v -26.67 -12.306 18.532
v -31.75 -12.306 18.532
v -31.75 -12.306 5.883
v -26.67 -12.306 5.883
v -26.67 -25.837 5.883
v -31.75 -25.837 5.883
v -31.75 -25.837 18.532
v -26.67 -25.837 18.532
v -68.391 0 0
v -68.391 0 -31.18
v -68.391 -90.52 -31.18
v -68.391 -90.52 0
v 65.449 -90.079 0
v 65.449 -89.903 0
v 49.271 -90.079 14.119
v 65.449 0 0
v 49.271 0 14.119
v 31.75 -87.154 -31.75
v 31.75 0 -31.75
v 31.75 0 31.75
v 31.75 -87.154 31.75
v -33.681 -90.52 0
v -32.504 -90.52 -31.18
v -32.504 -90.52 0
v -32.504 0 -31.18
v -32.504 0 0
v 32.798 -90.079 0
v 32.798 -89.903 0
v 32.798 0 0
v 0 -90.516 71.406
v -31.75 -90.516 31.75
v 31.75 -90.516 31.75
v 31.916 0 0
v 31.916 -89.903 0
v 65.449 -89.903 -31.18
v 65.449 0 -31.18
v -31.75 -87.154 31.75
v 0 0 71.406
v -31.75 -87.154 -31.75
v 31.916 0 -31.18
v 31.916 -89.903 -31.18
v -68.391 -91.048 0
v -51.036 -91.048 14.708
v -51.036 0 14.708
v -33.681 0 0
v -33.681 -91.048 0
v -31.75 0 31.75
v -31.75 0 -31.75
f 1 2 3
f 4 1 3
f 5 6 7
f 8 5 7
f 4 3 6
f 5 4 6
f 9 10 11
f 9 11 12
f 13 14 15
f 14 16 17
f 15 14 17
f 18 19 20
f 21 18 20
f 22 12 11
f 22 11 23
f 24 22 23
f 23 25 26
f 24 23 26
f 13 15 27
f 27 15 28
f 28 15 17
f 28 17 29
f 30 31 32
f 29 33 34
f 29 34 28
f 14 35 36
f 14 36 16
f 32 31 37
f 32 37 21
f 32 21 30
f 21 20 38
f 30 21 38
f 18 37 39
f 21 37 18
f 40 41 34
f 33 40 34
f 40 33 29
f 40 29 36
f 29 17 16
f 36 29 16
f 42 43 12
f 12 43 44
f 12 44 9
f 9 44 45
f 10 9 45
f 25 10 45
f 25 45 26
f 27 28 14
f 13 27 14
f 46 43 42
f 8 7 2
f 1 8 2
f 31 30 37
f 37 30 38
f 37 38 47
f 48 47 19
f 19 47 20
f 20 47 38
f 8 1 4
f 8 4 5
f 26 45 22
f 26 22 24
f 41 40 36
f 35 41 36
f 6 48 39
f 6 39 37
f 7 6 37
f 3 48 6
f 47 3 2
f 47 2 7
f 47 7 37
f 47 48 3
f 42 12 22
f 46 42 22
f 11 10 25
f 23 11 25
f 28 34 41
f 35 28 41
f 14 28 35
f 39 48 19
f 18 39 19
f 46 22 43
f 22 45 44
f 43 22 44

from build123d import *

# Parameters (mm, degrees)
F0_W      = 63.5
F0_H      = 63.5
F1_DEPTH  = 90.51564
F3_W      = 10.2954022586
F3_H      = 21.1791172624
F4_DEPTH  = 1.27
F6_W      = 6.7655518651
F6_H      = 6.3243201002
F7_DEPTH  = 5.08
F8_W      = 35.8868353069
F8_H      = 31.1803687364
F9_DEPTH  = 90.5202
F12_W     = 33.533602953
F12_H     = 31.1803687364
F13_DEPTH = 89.9029
F17_DEPTH = 90.07895
F19_DEPTH = 91.04824
F2_W      = 63.5
F2_H      = 63.5
F22_DEPTH = 3.36136


# Not quite as in the source:
# - the program builds the solid bodies; features that only make, move or delete a surface that nothing else refers to are left out


with BuildPart() as f1:
    # F0 (on Front) → F1 (new body)
    with BuildSketch(Plane.XZ):
        Polygon((-31.75, 31.75), (31.75, 31.75), (0, 71.4057372898), align=None)
        Rectangle(F0_W, F0_H)
    extrude(amount=F1_DEPTH)

    # F3 (on face) → F4 (cut)
    with BuildSketch(Plane.XZ.offset(90.51564)):
        with Locations((0, -20.0025010854)):
            Rectangle(F3_W, F3_H)
    extrude(amount=-F4_DEPTH, mode=Mode.SUBTRACT)

    # F6 (on face) → F7 (cut)
    with BuildSketch(Plane(origin=(-31.75, 0, 0), x_dir=(0, -1, 0), z_dir=(-1, 0, 0))):
        with Locations((15.6882982701, 15.3695684858)):
            Rectangle(F6_W, F6_H)
        with Locations((22.4538501352, 15.3695684858)):
            Rectangle(F6_W, F6_H)
        with Locations((22.4538501352, 9.0452483855)):
            Rectangle(F6_W, F6_H)
        with Locations((15.6882982701, 9.0452483855)):
            Rectangle(F6_W, F6_H)
    extrude(amount=-F7_DEPTH, mode=Mode.SUBTRACT)

    # F2 (on face) → F22 (cut)
    with BuildSketch(Plane.XZ.offset(90.51564)):
        Rectangle(F2_W, F2_H)
    extrude(amount=-F22_DEPTH, mode=Mode.SUBTRACT)


with BuildPart() as f9:
    # F8 (on Front) → F9 (new body)
    with BuildSketch(Plane.XZ):
        with Locations((-50.4474807531, -15.5901843682)):
            Rectangle(F8_W, F8_H)
    extrude(amount=F9_DEPTH)

    # F18 (on Front) → F19 (join)
    with BuildSketch(Plane.XZ):
        Polygon((-51.0357916355, 14.7077208385), (-68.3908984065, 0), (-33.6806811392, 0), align=None)
    extrude(amount=F19_DEPTH)


with BuildPart() as f13:
    # F12 (on Front) → F13 (new body)
    with BuildSketch(Plane.XZ):
        with Locations((48.6825555563, -15.5901843682)):
            Rectangle(F12_W, F12_H)
    extrude(amount=F13_DEPTH)

    # F16 (on Front) → F17 (join)
    with BuildSketch(Plane.XZ):
        Polygon((32.7982157469, 0), (65.4493570328, 0), (49.2708645761, 14.11941275), align=None)
    extrude(amount=F17_DEPTH)


solid = Compound([f1.part, f9.part, f13.part])
